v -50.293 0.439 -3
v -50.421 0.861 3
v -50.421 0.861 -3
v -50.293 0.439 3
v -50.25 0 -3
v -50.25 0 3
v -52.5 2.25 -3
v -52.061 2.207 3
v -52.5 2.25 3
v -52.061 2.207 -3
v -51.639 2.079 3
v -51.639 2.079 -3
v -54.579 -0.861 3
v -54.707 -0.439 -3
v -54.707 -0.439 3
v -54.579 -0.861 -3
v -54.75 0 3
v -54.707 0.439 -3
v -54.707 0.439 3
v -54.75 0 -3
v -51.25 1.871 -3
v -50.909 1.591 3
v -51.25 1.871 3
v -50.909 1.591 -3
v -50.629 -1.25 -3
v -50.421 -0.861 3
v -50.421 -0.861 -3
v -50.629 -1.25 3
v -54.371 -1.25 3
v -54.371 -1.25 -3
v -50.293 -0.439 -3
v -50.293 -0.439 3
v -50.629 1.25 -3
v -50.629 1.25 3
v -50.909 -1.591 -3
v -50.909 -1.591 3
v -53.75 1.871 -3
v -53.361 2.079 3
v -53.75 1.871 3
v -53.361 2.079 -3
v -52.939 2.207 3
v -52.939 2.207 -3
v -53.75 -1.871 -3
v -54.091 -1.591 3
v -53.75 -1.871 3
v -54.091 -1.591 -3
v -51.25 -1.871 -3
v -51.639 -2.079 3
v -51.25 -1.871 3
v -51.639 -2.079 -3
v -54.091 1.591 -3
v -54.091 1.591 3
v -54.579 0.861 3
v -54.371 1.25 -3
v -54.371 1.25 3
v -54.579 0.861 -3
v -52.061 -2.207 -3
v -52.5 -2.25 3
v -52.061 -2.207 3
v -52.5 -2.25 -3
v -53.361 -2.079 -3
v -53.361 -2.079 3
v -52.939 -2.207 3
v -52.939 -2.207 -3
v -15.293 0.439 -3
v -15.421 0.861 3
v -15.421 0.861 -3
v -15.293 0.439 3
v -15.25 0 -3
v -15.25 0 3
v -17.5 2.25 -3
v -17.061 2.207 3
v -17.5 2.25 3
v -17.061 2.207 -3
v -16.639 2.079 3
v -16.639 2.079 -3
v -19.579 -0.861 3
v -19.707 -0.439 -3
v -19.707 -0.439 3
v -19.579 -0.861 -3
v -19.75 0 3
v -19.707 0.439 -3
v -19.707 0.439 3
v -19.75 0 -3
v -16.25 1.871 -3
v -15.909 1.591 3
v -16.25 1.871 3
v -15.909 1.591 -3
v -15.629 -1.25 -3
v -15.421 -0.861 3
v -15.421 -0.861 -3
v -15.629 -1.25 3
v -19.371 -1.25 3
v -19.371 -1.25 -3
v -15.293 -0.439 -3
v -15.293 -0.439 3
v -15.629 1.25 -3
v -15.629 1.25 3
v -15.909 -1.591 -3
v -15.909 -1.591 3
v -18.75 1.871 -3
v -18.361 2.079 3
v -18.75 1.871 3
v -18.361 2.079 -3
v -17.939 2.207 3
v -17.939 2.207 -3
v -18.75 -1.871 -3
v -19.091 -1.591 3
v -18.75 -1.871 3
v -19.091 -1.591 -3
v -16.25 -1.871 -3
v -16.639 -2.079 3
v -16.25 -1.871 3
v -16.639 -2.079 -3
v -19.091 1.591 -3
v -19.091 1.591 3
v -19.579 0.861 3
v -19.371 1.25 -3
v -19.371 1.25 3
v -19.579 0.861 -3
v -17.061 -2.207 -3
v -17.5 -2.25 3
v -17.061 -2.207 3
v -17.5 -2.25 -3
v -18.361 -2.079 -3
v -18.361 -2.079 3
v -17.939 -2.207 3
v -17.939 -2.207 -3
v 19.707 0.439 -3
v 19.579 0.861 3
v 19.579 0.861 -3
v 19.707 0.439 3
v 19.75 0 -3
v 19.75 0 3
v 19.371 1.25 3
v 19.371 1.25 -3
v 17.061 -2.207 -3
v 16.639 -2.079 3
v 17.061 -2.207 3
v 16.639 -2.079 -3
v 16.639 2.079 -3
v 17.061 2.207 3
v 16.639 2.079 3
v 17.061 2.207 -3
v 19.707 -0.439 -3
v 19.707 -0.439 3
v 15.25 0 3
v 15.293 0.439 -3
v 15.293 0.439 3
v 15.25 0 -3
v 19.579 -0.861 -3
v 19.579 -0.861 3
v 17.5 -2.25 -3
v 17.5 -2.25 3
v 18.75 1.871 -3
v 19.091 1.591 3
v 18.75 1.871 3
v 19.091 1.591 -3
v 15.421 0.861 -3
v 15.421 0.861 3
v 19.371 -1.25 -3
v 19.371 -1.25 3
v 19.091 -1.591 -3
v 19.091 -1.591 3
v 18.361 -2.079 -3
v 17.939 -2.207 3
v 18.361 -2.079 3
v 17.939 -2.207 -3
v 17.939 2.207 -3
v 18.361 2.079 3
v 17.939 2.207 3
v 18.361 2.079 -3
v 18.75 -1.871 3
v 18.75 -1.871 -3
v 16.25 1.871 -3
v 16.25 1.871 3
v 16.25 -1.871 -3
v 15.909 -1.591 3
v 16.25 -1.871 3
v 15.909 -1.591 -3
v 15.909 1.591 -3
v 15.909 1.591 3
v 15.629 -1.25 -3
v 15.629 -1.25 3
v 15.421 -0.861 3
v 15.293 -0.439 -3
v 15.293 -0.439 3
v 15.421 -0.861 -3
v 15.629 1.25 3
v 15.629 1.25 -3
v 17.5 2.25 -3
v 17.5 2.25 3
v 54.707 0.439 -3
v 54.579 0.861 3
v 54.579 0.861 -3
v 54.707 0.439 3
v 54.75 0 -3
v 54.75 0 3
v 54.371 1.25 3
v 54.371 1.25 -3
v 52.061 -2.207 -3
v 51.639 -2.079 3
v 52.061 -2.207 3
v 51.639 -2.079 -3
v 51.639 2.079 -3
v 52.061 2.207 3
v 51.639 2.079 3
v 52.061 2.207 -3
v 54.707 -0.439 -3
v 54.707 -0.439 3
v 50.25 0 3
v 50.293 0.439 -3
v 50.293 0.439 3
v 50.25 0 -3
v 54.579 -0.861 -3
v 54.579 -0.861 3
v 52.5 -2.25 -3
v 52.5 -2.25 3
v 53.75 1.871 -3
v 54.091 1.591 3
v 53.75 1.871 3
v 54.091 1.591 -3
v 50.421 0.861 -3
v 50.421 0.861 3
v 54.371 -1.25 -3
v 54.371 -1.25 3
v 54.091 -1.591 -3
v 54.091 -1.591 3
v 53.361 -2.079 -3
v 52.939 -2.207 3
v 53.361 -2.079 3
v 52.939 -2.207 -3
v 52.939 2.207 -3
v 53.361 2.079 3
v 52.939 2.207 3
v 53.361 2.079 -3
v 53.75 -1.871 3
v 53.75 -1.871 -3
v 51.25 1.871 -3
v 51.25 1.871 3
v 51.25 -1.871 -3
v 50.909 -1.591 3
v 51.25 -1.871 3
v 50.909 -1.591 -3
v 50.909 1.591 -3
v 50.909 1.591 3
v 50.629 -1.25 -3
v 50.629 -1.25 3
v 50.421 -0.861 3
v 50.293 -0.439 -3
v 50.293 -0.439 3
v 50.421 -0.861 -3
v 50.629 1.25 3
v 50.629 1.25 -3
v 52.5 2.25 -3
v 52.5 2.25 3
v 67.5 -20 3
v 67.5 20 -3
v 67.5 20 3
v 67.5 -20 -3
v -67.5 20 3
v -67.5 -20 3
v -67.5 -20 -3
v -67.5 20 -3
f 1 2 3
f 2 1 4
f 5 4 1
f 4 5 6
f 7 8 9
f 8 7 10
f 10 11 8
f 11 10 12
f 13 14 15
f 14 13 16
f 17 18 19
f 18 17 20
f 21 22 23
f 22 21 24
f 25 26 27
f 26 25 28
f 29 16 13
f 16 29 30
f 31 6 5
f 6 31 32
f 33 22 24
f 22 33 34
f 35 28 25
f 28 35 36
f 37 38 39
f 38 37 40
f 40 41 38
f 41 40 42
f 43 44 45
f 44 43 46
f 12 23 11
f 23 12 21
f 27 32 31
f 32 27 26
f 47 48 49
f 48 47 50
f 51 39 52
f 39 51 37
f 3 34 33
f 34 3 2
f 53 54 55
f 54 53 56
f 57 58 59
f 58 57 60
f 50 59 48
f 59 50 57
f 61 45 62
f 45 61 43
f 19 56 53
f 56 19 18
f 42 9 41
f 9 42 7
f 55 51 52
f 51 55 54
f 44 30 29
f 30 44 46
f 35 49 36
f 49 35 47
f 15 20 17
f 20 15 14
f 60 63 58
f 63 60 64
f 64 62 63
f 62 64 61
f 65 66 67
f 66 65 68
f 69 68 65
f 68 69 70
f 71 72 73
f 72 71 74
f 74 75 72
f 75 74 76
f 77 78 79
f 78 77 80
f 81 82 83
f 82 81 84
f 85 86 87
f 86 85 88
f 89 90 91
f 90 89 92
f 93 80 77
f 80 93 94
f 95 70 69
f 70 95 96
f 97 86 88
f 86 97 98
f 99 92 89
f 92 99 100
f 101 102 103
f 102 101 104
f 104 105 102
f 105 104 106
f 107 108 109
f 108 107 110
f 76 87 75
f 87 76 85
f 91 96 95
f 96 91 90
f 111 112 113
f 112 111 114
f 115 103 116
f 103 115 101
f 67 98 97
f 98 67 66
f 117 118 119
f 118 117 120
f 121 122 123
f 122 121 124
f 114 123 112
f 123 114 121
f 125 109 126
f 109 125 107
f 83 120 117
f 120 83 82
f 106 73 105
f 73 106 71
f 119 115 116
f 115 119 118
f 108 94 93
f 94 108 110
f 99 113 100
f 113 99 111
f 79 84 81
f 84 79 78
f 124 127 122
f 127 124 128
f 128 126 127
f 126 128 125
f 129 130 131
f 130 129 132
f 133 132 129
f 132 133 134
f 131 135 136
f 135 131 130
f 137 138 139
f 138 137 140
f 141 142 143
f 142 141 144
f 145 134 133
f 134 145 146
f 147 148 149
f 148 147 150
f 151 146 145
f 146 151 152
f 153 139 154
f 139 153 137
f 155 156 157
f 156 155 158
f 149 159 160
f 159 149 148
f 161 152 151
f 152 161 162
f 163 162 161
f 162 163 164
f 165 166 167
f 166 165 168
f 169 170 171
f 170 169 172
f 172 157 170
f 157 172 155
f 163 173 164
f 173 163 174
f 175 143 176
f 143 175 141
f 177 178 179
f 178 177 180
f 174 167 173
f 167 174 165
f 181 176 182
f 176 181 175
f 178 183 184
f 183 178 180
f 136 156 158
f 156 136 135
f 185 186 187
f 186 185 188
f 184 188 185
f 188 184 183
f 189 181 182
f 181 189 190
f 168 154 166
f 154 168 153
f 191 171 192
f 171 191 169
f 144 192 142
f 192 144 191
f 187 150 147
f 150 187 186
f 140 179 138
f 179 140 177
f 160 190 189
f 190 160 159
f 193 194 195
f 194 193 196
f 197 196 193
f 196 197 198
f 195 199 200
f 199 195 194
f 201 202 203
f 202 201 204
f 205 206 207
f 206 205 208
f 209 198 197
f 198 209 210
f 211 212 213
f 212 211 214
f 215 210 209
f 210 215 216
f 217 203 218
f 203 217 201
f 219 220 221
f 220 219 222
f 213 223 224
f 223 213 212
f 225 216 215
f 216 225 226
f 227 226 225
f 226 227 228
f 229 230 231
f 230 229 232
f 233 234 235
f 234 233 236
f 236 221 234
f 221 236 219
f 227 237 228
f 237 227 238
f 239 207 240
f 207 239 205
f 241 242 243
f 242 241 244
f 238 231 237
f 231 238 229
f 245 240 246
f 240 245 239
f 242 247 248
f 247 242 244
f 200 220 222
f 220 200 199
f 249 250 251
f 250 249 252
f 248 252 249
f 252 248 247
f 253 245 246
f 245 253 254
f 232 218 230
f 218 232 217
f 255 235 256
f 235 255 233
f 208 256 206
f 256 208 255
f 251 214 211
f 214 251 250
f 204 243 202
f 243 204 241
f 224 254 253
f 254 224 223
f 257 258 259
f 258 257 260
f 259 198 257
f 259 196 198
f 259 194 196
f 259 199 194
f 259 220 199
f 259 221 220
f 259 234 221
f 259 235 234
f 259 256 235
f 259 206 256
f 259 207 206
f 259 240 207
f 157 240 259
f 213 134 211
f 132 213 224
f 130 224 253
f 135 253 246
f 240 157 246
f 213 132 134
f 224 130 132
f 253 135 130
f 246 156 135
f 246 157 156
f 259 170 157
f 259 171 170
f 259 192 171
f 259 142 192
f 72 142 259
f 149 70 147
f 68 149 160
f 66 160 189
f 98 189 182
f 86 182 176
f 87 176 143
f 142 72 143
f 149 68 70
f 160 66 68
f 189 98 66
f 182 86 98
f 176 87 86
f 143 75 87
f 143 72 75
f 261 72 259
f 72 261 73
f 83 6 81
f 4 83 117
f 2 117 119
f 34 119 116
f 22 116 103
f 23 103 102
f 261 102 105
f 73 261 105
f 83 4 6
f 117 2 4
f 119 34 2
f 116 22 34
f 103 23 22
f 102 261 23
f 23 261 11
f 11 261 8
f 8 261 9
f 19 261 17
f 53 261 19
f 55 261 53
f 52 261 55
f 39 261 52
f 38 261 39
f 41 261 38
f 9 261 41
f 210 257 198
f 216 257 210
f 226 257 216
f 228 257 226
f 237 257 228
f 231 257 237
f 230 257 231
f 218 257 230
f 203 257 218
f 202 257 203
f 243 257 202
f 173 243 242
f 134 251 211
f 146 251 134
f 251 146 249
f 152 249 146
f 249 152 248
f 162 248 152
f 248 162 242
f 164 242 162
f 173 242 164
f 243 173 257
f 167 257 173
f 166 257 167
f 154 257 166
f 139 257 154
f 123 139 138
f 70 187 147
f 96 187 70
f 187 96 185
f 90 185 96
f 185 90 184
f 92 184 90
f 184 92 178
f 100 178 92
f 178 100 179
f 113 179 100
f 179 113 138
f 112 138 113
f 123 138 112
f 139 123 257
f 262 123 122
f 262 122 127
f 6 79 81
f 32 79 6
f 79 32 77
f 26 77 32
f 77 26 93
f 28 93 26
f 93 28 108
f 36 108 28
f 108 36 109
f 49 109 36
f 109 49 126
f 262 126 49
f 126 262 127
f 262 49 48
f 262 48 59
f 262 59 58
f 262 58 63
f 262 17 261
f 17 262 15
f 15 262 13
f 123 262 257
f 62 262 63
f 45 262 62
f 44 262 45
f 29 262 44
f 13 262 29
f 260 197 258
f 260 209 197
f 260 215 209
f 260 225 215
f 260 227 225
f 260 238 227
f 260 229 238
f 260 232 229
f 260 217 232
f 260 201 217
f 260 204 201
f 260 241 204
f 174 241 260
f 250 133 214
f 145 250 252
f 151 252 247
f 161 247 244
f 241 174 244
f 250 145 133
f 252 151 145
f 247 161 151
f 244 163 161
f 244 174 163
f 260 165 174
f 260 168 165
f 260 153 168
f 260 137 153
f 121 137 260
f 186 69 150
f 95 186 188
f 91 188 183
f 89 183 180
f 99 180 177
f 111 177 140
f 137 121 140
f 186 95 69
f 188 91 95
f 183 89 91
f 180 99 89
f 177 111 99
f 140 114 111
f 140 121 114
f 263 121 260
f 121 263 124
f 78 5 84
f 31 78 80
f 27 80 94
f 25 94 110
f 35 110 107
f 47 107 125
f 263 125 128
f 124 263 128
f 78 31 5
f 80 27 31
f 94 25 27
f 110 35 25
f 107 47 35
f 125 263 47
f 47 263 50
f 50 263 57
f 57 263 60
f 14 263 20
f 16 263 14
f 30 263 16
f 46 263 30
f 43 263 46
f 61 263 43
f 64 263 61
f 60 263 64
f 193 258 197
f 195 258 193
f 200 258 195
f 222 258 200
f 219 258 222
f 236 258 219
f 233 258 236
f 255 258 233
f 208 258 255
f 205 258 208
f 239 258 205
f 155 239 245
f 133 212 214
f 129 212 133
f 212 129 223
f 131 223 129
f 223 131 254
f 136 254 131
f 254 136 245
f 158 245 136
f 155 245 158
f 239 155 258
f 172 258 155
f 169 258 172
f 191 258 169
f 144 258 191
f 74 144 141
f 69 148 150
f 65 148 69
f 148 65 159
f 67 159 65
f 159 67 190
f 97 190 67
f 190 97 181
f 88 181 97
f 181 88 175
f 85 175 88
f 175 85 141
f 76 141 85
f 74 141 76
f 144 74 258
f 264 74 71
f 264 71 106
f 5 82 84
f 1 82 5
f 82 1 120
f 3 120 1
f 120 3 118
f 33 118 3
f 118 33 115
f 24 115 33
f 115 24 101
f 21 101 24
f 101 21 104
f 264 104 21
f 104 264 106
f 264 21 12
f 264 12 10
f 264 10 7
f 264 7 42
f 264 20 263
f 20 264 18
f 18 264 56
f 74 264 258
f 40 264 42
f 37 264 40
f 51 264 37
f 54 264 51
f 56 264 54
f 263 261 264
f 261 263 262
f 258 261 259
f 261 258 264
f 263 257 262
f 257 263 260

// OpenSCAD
$fn = 32;

// ----------------------------------------------------------------------
// Hole bar, 4 x Ø4.5
// row layout, 15 mm edge offset
// ----------------------------------------------------------------------

// --- parameters (mm) ---
bar_w = 40;    // bar width (Y)
bar_t = 6;     // bar thickness (Z)
holes = 4;     // holes per row
hole_d = 4.5;  // hole diameter
edge = 15;     // offset from the bar end to the first hole
pitch = 35;    // pitch between neighbouring holes

// --- derived feature positions (mm) ---
span = (holes - 1) * pitch;   // = 105   distance between the end holes
bar_l = span + 2 * edge;      // = 135   overall bar length
start_x = -bar_l / 2 + edge;  // = -52.5   X of the first hole
feature_centers = [
  [start_x + 0 * pitch, 0],
  [start_x + 1 * pitch, 0],
  [start_x + 2 * pitch, 0],
  [start_x + 3 * pitch, 0]
];   // hole centres of the first row

// bar with one row of holes, drilled from feature_centers
difference() {
  translate([-bar_l / 2, -bar_w / 2, -bar_t / 2]) cube([bar_l, bar_w, bar_t]);
  for (centre = feature_centers)
    translate([centre[0], centre[1], 0])
      cylinder(d = hole_d, h = bar_t + 2, center = true);
}
